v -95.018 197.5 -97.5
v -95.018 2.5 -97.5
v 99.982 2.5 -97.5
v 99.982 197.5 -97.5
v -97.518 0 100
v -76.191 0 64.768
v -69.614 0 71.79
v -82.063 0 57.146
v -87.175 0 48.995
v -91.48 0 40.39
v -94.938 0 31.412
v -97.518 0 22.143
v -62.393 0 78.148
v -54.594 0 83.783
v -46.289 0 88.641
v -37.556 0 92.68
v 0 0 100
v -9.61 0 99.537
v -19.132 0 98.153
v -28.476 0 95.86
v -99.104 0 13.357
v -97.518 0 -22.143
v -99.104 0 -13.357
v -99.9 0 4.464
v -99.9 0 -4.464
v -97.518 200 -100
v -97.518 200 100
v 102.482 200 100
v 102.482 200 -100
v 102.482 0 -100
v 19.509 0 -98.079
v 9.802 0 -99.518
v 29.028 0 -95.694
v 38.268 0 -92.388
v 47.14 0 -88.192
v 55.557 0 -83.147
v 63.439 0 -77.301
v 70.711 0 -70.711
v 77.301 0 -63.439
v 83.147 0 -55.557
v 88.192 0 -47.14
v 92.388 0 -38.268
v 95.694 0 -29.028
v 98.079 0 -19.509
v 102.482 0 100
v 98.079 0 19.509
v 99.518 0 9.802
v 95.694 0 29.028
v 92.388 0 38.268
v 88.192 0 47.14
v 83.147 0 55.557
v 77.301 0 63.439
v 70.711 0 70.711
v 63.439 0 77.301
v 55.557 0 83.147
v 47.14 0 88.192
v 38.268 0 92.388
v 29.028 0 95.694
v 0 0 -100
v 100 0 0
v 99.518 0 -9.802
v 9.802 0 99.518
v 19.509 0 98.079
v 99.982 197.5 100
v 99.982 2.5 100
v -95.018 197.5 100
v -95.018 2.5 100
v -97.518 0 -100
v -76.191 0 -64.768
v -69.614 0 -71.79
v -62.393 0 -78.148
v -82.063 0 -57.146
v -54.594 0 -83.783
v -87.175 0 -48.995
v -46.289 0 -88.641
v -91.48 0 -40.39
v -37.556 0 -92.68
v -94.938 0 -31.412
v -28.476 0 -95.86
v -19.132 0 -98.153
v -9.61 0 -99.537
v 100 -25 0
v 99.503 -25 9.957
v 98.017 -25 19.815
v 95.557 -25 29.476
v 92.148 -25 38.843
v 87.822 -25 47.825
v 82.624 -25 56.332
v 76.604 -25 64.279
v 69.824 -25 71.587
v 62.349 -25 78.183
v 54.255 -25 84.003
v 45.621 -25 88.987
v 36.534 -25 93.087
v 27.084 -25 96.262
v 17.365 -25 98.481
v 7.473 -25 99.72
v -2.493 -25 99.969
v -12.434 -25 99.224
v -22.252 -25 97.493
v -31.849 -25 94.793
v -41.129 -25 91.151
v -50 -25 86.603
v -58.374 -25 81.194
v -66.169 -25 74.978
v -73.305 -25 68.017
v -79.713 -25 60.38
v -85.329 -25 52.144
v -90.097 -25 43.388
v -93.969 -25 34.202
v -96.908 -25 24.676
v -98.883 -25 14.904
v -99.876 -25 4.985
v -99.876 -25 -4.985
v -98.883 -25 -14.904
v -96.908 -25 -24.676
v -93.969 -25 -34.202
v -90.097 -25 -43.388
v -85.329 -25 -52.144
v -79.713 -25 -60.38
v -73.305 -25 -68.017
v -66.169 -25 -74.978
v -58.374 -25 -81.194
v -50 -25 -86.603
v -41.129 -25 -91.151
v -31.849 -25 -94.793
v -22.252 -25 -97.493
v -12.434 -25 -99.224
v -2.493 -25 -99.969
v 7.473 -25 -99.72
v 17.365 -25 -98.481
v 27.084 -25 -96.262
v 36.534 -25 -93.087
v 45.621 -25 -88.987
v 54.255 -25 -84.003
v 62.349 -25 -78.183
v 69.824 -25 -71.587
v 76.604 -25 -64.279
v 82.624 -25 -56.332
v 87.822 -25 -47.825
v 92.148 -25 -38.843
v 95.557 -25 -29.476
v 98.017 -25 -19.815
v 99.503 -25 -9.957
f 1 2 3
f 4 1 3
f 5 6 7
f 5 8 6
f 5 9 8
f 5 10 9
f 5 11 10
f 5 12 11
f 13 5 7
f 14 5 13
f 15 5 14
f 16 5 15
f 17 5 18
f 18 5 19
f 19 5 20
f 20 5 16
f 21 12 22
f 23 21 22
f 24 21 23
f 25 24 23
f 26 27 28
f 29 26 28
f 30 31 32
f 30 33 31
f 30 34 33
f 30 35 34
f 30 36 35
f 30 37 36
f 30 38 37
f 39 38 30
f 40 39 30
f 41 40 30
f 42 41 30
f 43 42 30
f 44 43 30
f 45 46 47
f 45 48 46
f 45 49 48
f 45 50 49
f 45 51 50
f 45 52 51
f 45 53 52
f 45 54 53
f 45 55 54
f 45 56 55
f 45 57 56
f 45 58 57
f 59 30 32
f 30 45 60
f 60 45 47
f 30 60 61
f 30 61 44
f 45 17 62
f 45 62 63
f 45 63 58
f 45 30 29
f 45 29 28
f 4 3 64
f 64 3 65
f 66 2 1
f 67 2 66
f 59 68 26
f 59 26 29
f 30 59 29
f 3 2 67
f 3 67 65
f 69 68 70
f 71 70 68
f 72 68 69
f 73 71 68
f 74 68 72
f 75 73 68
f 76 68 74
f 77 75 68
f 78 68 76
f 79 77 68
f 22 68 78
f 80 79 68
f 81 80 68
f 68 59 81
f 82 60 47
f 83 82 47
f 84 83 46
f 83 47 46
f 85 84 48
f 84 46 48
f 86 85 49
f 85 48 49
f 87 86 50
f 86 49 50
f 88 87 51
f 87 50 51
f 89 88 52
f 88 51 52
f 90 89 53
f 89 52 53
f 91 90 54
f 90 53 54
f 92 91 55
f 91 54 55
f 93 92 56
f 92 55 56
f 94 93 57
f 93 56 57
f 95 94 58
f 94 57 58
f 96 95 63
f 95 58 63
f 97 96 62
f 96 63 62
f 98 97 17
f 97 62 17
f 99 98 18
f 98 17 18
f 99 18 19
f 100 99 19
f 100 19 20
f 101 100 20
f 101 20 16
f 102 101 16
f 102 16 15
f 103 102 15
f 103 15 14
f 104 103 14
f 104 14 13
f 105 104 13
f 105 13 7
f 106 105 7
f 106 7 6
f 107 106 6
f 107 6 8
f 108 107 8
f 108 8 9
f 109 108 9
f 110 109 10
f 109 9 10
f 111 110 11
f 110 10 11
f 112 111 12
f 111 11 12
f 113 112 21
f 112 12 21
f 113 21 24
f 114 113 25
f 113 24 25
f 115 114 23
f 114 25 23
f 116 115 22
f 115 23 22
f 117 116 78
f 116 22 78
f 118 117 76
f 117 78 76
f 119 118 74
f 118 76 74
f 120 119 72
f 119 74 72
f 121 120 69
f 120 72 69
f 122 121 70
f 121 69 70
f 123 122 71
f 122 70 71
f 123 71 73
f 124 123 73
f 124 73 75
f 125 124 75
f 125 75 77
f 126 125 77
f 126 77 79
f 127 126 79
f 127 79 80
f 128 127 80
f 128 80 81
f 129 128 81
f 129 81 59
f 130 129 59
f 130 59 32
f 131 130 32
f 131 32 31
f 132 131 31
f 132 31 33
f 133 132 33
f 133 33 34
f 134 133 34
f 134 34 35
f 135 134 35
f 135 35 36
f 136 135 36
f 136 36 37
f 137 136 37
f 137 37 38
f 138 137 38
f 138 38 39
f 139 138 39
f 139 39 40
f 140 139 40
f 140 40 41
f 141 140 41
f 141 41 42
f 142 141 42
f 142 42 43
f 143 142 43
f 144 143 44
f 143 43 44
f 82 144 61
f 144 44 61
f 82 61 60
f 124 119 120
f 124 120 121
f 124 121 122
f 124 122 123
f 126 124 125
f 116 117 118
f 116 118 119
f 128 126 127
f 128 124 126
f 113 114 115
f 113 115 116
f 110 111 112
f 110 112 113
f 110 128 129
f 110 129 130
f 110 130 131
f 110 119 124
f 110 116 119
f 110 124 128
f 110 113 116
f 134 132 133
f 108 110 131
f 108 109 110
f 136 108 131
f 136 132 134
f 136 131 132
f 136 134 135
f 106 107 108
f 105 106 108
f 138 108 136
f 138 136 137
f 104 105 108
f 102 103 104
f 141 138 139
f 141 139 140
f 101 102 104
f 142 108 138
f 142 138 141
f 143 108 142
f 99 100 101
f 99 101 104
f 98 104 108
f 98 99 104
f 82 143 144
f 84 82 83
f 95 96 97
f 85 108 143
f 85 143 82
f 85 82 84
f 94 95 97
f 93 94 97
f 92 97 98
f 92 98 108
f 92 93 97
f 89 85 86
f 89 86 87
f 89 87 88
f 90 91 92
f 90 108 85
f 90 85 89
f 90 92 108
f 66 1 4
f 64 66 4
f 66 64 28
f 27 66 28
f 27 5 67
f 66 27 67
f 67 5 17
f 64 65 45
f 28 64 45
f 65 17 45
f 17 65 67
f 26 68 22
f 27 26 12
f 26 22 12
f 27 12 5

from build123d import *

# Parameters (mm, degrees)
F0_W     = 200
F0_H     = 200
F1_DEPTH = 200
F4_T     = -2.5
F5_R     = 100
F6_DEPTH = 25


# Not quite as in the source:
# - the program builds the solid bodies; features that only make, move or delete a surface that nothing else refers to are left out


with BuildPart() as f1:
    # F0 (on Front) → F1 (new body)
    with BuildSketch(Plane.XZ):
        with Locations((2.4823185522, 0)):
            Rectangle(F0_W, F0_H)
    extrude(amount=-F1_DEPTH)

    # F4
    f4_openings = [f1.faces().sort_by_distance(p)[0] for p in [
        (2.482319, 100, 100),
    ]]
    offset(amount=F4_T, openings=f4_openings)

    # F5 (on face) → F6 (join)
    with BuildSketch(Plane.XZ):
        Circle(F5_R)
    extrude(amount=F6_DEPTH)


solid = f1.part
